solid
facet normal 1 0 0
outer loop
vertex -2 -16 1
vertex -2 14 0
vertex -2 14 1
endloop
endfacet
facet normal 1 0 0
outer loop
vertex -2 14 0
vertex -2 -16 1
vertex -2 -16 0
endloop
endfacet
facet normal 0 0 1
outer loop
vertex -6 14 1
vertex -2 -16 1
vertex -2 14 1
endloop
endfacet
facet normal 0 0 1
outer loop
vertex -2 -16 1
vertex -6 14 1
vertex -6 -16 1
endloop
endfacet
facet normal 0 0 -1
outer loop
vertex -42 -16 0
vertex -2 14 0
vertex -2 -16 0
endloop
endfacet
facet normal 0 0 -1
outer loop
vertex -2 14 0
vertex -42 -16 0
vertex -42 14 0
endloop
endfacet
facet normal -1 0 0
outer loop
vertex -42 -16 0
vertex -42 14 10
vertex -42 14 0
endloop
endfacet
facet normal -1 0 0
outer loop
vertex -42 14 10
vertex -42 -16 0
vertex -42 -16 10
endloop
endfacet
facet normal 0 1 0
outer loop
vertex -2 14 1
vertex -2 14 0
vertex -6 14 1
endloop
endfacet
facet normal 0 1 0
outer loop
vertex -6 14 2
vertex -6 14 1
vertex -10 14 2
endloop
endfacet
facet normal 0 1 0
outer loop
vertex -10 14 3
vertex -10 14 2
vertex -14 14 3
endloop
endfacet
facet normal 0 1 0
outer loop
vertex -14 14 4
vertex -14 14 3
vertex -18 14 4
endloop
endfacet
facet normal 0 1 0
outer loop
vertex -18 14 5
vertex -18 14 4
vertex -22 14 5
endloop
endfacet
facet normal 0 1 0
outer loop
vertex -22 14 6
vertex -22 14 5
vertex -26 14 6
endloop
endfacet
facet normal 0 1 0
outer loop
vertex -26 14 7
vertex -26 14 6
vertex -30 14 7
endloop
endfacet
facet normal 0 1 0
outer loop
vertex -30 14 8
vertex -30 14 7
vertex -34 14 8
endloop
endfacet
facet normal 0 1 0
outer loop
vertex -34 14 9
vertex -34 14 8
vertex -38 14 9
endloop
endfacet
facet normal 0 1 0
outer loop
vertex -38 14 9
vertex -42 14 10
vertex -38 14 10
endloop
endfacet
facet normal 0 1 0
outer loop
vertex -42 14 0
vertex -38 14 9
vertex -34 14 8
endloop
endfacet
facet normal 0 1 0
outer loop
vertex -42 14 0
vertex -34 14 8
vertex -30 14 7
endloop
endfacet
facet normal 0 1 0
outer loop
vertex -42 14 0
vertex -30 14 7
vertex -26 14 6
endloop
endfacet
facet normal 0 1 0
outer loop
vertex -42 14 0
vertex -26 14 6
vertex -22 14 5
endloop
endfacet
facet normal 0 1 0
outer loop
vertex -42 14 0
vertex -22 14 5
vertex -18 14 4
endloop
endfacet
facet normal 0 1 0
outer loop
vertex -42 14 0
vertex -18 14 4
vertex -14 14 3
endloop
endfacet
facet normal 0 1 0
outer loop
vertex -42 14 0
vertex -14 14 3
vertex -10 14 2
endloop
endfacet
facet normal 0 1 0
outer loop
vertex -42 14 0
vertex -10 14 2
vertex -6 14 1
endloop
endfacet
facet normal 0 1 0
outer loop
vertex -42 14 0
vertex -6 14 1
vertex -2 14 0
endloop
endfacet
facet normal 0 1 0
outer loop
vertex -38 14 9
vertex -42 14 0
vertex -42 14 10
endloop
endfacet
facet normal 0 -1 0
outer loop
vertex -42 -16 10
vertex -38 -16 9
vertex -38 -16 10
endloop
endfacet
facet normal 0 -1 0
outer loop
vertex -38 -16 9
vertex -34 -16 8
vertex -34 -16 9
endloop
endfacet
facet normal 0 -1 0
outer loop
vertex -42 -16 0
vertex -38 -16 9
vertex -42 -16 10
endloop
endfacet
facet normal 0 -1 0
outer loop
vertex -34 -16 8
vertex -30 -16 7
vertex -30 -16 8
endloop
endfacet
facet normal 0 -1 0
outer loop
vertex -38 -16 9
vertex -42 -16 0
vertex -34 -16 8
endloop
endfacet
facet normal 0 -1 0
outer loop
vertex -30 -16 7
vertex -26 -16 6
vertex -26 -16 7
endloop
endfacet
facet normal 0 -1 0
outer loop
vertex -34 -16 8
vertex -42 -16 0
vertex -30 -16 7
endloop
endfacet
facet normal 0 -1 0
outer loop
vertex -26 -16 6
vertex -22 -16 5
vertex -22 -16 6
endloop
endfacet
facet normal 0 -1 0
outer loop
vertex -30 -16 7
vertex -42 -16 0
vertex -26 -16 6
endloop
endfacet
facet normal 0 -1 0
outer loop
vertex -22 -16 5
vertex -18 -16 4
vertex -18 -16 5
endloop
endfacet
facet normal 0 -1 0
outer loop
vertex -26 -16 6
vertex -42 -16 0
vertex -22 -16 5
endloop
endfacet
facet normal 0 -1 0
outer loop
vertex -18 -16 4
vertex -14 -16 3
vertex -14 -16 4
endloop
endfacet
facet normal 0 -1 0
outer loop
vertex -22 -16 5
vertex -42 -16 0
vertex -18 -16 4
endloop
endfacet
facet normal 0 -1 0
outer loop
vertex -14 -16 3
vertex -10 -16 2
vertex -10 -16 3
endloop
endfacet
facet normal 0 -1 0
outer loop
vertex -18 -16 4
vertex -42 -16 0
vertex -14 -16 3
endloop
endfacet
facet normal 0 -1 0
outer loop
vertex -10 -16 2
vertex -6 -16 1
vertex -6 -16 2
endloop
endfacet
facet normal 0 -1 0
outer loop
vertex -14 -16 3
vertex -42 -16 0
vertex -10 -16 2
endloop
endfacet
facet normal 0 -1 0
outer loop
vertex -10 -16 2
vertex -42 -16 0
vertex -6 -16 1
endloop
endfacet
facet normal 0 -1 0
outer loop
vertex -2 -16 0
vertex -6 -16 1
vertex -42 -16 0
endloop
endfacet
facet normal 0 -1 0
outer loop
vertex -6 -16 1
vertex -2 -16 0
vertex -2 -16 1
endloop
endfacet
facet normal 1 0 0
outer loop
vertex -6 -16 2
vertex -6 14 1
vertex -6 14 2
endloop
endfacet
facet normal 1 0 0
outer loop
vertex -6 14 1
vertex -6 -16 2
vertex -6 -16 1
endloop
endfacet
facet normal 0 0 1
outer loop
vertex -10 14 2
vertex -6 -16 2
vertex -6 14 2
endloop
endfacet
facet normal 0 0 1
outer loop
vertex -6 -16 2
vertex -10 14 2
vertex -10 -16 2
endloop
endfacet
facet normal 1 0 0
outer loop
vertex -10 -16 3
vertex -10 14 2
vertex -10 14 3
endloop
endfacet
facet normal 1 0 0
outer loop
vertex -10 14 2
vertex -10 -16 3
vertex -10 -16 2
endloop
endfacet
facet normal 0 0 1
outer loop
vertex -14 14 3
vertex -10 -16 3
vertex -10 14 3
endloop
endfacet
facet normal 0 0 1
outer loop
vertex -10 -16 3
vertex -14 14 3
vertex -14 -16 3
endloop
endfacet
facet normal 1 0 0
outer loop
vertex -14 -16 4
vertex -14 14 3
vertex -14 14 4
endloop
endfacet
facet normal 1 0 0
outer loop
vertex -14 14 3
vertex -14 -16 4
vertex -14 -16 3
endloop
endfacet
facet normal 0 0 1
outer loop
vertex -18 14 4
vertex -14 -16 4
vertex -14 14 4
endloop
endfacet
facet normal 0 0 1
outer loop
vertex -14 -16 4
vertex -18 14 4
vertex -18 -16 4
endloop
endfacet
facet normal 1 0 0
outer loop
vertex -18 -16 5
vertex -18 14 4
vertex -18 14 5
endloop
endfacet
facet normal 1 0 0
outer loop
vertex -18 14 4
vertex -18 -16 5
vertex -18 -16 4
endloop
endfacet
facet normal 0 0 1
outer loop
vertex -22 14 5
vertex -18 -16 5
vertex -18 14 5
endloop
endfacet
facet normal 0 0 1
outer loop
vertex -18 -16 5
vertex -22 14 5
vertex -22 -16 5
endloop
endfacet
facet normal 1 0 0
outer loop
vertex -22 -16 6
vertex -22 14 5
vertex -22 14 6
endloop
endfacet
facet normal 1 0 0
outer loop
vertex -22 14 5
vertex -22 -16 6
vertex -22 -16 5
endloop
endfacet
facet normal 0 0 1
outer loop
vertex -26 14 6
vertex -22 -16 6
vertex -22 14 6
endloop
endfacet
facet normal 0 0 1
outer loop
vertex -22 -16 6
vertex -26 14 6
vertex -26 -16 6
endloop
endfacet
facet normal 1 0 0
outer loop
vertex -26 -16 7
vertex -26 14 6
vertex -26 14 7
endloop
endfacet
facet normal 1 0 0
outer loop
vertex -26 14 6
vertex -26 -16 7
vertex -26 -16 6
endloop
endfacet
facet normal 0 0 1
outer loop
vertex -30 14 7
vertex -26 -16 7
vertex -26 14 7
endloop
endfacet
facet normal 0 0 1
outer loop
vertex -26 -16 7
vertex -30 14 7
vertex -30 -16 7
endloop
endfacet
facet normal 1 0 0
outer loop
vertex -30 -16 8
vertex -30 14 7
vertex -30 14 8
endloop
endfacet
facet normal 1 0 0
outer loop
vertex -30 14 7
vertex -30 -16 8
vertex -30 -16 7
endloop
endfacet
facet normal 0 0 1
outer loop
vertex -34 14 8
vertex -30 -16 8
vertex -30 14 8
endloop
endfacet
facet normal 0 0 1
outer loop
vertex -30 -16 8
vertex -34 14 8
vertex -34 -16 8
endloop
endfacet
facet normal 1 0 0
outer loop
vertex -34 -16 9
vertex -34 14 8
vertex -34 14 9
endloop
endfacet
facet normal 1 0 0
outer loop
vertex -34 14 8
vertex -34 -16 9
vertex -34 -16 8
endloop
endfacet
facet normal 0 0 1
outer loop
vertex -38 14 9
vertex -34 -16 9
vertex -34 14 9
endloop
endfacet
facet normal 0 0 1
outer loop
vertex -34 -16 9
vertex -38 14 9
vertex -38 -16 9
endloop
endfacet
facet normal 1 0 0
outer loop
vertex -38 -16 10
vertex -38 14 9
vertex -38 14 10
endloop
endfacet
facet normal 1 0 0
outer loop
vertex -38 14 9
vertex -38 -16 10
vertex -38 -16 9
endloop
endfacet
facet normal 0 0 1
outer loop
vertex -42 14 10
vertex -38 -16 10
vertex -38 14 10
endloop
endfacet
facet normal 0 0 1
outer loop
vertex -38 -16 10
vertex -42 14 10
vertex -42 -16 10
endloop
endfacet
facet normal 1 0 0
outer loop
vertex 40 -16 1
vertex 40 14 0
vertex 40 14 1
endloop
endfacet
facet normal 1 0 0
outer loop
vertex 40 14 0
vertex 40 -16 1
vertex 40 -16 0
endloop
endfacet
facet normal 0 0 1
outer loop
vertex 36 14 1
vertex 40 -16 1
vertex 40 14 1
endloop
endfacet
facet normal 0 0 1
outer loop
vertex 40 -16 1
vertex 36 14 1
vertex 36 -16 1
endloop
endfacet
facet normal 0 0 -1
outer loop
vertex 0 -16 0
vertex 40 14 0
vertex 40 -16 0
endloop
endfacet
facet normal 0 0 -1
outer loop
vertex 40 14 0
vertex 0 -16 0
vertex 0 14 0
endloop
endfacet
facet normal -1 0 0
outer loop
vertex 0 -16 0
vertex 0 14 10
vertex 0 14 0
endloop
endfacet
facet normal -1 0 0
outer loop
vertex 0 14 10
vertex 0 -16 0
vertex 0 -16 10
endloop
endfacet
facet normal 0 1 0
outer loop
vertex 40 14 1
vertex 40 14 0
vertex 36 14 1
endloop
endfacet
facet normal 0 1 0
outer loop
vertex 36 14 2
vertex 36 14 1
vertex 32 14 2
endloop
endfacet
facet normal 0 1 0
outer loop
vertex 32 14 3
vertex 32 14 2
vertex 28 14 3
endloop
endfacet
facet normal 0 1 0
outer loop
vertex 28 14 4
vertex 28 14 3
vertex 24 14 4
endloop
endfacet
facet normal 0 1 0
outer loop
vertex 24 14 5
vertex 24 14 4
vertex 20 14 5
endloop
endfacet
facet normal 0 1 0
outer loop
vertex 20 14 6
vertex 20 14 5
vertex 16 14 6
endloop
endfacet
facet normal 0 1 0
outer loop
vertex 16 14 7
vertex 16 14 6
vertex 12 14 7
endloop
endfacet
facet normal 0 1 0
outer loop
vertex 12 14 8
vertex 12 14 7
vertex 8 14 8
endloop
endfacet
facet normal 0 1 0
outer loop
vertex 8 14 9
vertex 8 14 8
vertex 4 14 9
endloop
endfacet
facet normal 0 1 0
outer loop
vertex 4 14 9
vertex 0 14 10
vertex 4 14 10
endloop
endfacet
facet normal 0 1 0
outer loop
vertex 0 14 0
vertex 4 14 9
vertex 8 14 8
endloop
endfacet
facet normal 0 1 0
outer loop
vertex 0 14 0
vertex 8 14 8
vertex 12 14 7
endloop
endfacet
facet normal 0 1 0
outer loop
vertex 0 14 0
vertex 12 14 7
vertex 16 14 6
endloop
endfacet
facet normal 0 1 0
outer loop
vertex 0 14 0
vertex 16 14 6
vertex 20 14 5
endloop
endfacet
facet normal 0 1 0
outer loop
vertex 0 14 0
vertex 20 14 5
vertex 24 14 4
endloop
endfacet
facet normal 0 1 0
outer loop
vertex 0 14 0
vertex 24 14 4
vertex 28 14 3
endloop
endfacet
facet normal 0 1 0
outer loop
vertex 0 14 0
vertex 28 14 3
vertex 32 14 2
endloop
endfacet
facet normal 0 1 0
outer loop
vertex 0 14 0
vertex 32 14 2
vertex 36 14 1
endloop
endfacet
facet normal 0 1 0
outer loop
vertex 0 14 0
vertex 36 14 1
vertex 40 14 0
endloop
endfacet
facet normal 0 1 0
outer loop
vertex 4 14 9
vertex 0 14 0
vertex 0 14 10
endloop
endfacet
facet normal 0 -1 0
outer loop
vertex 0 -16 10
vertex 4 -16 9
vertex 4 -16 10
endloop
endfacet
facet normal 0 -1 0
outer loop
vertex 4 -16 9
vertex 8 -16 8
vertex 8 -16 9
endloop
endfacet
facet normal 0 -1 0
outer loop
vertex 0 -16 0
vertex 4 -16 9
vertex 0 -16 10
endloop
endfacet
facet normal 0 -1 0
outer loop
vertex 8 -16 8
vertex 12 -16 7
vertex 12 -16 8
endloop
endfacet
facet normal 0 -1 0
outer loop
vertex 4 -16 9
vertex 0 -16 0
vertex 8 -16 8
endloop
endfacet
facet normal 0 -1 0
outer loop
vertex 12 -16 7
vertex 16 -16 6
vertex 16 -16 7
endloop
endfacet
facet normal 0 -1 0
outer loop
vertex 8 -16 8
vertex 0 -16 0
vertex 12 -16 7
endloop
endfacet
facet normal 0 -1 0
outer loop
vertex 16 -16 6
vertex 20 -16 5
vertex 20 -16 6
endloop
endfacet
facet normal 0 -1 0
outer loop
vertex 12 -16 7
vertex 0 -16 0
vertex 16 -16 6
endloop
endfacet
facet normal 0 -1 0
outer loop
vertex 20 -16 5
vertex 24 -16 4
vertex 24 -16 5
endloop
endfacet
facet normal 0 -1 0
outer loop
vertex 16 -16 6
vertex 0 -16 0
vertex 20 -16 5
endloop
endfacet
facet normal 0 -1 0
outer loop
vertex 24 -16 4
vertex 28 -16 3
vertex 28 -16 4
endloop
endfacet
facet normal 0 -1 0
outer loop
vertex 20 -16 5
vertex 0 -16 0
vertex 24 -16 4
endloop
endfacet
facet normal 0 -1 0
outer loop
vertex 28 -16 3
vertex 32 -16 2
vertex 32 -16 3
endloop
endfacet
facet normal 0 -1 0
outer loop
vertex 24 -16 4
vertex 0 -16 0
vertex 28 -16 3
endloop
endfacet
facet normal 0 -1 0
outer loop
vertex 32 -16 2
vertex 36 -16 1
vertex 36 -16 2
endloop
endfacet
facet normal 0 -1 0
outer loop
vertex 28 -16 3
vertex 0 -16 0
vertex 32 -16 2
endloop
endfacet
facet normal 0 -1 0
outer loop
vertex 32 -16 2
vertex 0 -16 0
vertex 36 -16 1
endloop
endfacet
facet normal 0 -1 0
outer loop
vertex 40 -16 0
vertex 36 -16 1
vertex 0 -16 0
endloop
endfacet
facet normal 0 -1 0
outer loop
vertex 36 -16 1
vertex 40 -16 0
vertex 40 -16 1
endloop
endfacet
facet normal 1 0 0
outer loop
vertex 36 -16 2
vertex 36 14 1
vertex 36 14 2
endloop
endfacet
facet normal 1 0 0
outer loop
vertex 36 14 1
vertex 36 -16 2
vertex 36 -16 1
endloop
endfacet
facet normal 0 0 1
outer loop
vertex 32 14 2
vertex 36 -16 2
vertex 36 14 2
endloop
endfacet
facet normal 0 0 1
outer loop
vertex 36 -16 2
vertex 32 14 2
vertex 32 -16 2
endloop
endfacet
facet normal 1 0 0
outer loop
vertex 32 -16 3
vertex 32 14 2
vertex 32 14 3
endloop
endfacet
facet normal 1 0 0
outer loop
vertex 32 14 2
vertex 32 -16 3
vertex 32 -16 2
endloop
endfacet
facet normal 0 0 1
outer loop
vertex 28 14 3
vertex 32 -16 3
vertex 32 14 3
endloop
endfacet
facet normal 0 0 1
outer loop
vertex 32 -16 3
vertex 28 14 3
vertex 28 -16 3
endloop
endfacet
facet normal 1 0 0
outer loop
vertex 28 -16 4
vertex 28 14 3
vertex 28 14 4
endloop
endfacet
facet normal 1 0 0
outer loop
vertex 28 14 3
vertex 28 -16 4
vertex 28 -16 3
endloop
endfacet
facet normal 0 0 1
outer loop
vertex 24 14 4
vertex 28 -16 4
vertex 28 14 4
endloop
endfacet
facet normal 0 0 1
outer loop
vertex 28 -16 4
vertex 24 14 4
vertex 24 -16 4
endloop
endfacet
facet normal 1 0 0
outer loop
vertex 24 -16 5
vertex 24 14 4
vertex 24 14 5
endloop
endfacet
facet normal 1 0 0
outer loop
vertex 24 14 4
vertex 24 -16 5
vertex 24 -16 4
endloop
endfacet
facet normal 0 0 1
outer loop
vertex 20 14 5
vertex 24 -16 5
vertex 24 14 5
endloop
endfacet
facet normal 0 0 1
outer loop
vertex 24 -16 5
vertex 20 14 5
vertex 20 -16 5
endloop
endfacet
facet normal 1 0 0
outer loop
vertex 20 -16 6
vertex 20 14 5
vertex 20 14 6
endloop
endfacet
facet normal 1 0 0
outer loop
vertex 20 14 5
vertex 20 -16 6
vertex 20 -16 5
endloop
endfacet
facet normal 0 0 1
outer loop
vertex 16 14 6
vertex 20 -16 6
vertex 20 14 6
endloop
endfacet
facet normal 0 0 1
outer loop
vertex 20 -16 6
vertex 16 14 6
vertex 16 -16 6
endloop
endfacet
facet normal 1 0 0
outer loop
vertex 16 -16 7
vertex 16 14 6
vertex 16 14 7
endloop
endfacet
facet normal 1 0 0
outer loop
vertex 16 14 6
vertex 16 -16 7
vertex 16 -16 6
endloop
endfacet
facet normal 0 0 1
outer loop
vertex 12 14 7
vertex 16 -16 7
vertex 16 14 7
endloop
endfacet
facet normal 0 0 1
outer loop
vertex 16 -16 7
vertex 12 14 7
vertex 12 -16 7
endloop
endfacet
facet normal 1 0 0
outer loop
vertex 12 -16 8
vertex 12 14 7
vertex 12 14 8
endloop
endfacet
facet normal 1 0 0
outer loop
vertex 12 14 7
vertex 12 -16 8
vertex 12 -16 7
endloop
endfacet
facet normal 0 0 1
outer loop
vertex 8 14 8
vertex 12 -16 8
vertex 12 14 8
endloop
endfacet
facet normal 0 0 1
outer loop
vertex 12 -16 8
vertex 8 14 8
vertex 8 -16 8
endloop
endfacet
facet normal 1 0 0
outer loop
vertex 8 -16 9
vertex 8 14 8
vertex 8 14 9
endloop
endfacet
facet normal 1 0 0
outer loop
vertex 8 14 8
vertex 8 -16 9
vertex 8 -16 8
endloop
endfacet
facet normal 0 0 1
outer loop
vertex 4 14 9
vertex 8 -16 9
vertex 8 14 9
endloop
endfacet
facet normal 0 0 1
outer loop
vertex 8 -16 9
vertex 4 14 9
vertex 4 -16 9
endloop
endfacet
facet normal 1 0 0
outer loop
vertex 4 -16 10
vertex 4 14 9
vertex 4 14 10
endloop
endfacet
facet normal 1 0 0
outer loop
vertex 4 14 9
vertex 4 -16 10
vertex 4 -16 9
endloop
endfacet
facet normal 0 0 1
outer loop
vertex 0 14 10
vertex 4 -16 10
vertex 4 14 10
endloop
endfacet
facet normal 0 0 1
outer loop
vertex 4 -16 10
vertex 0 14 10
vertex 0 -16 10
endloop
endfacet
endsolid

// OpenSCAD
//
//  Toilet_shim
//
//  EvilTeach 11/2015
//
//  This model generates a shim suitable for adjusting your toilet.
//  It is basically a series of smaller and smaller rectangles.
//  As it is parameterized, you can generate it however you want.
//
//  It also lets you print multiple copies.   By default it prints two.
//
//  This is post-card-ware.  Let me know in a comment how this worked out
//  for you.  Defect reports, and suggestions for improvements are always welcome.
//
//  I recommend you use ABS with at least a 50% fill.
//  Anything lower that 4 as a stepDepth doesn't work as well.
//  Your toilet bottom edge will vary, so it may take a print or two
//  to zero in on your desired depth.
//


shimsPerRow  =  1;        // How many shims to fit on print on the X axis
rowsPerPrint =  2;        // How many rows of shims to print on the Y axis

shimLength   = 40;        // Total Length of the shim
shimWidth    = 30;        // Total Width of the shim

stepDepth    =  4;        // The depth of one step of the shim
stepHeight   =  1;        // The height of one step of the shim
stepWidth    = shimWidth; // The width of one step of the shim


//
//  This function draws exactly one layers of the shim
//
module draw_one_layer(length)
{
    translate([0, 0, (shimLength - length) / stepDepth * stepHeight])
        cube([length, stepWidth, stepHeight]);
}


//
//  This function draws exactly one shim
//  at the given offset
//
module draw_one_shim(xOffset, yOffset)
{
    gapBetweenShims = 2;
    
    translate([yOffset * (shimLength + gapBetweenShims), 
               xOffset * (shimWidth  + gapBetweenShims), 
               0])
        for (length=[shimLength : -stepDepth : stepDepth])
        {
            draw_one_layer(length);
        }
}

//
//  This function iterate over the desired number of shims per row
//  and shims per column, drawing each shim as it goes.
//  The loops are designed to try to keep things centered on the build plate
//
module main()
{
    for (yOffset = [-rowsPerPrint / 2 : 1 : rowsPerPrint / 2 - 1])
    {
        for (xOffset =[-shimsPerRow / 2 : 1 : shimsPerRow / 2 - 1])
        {
            draw_one_shim(xOffset, yOffset);
        }
    }
}

// Welcome to the entry point. 
// Can you tell I am a C programmer?
main();
